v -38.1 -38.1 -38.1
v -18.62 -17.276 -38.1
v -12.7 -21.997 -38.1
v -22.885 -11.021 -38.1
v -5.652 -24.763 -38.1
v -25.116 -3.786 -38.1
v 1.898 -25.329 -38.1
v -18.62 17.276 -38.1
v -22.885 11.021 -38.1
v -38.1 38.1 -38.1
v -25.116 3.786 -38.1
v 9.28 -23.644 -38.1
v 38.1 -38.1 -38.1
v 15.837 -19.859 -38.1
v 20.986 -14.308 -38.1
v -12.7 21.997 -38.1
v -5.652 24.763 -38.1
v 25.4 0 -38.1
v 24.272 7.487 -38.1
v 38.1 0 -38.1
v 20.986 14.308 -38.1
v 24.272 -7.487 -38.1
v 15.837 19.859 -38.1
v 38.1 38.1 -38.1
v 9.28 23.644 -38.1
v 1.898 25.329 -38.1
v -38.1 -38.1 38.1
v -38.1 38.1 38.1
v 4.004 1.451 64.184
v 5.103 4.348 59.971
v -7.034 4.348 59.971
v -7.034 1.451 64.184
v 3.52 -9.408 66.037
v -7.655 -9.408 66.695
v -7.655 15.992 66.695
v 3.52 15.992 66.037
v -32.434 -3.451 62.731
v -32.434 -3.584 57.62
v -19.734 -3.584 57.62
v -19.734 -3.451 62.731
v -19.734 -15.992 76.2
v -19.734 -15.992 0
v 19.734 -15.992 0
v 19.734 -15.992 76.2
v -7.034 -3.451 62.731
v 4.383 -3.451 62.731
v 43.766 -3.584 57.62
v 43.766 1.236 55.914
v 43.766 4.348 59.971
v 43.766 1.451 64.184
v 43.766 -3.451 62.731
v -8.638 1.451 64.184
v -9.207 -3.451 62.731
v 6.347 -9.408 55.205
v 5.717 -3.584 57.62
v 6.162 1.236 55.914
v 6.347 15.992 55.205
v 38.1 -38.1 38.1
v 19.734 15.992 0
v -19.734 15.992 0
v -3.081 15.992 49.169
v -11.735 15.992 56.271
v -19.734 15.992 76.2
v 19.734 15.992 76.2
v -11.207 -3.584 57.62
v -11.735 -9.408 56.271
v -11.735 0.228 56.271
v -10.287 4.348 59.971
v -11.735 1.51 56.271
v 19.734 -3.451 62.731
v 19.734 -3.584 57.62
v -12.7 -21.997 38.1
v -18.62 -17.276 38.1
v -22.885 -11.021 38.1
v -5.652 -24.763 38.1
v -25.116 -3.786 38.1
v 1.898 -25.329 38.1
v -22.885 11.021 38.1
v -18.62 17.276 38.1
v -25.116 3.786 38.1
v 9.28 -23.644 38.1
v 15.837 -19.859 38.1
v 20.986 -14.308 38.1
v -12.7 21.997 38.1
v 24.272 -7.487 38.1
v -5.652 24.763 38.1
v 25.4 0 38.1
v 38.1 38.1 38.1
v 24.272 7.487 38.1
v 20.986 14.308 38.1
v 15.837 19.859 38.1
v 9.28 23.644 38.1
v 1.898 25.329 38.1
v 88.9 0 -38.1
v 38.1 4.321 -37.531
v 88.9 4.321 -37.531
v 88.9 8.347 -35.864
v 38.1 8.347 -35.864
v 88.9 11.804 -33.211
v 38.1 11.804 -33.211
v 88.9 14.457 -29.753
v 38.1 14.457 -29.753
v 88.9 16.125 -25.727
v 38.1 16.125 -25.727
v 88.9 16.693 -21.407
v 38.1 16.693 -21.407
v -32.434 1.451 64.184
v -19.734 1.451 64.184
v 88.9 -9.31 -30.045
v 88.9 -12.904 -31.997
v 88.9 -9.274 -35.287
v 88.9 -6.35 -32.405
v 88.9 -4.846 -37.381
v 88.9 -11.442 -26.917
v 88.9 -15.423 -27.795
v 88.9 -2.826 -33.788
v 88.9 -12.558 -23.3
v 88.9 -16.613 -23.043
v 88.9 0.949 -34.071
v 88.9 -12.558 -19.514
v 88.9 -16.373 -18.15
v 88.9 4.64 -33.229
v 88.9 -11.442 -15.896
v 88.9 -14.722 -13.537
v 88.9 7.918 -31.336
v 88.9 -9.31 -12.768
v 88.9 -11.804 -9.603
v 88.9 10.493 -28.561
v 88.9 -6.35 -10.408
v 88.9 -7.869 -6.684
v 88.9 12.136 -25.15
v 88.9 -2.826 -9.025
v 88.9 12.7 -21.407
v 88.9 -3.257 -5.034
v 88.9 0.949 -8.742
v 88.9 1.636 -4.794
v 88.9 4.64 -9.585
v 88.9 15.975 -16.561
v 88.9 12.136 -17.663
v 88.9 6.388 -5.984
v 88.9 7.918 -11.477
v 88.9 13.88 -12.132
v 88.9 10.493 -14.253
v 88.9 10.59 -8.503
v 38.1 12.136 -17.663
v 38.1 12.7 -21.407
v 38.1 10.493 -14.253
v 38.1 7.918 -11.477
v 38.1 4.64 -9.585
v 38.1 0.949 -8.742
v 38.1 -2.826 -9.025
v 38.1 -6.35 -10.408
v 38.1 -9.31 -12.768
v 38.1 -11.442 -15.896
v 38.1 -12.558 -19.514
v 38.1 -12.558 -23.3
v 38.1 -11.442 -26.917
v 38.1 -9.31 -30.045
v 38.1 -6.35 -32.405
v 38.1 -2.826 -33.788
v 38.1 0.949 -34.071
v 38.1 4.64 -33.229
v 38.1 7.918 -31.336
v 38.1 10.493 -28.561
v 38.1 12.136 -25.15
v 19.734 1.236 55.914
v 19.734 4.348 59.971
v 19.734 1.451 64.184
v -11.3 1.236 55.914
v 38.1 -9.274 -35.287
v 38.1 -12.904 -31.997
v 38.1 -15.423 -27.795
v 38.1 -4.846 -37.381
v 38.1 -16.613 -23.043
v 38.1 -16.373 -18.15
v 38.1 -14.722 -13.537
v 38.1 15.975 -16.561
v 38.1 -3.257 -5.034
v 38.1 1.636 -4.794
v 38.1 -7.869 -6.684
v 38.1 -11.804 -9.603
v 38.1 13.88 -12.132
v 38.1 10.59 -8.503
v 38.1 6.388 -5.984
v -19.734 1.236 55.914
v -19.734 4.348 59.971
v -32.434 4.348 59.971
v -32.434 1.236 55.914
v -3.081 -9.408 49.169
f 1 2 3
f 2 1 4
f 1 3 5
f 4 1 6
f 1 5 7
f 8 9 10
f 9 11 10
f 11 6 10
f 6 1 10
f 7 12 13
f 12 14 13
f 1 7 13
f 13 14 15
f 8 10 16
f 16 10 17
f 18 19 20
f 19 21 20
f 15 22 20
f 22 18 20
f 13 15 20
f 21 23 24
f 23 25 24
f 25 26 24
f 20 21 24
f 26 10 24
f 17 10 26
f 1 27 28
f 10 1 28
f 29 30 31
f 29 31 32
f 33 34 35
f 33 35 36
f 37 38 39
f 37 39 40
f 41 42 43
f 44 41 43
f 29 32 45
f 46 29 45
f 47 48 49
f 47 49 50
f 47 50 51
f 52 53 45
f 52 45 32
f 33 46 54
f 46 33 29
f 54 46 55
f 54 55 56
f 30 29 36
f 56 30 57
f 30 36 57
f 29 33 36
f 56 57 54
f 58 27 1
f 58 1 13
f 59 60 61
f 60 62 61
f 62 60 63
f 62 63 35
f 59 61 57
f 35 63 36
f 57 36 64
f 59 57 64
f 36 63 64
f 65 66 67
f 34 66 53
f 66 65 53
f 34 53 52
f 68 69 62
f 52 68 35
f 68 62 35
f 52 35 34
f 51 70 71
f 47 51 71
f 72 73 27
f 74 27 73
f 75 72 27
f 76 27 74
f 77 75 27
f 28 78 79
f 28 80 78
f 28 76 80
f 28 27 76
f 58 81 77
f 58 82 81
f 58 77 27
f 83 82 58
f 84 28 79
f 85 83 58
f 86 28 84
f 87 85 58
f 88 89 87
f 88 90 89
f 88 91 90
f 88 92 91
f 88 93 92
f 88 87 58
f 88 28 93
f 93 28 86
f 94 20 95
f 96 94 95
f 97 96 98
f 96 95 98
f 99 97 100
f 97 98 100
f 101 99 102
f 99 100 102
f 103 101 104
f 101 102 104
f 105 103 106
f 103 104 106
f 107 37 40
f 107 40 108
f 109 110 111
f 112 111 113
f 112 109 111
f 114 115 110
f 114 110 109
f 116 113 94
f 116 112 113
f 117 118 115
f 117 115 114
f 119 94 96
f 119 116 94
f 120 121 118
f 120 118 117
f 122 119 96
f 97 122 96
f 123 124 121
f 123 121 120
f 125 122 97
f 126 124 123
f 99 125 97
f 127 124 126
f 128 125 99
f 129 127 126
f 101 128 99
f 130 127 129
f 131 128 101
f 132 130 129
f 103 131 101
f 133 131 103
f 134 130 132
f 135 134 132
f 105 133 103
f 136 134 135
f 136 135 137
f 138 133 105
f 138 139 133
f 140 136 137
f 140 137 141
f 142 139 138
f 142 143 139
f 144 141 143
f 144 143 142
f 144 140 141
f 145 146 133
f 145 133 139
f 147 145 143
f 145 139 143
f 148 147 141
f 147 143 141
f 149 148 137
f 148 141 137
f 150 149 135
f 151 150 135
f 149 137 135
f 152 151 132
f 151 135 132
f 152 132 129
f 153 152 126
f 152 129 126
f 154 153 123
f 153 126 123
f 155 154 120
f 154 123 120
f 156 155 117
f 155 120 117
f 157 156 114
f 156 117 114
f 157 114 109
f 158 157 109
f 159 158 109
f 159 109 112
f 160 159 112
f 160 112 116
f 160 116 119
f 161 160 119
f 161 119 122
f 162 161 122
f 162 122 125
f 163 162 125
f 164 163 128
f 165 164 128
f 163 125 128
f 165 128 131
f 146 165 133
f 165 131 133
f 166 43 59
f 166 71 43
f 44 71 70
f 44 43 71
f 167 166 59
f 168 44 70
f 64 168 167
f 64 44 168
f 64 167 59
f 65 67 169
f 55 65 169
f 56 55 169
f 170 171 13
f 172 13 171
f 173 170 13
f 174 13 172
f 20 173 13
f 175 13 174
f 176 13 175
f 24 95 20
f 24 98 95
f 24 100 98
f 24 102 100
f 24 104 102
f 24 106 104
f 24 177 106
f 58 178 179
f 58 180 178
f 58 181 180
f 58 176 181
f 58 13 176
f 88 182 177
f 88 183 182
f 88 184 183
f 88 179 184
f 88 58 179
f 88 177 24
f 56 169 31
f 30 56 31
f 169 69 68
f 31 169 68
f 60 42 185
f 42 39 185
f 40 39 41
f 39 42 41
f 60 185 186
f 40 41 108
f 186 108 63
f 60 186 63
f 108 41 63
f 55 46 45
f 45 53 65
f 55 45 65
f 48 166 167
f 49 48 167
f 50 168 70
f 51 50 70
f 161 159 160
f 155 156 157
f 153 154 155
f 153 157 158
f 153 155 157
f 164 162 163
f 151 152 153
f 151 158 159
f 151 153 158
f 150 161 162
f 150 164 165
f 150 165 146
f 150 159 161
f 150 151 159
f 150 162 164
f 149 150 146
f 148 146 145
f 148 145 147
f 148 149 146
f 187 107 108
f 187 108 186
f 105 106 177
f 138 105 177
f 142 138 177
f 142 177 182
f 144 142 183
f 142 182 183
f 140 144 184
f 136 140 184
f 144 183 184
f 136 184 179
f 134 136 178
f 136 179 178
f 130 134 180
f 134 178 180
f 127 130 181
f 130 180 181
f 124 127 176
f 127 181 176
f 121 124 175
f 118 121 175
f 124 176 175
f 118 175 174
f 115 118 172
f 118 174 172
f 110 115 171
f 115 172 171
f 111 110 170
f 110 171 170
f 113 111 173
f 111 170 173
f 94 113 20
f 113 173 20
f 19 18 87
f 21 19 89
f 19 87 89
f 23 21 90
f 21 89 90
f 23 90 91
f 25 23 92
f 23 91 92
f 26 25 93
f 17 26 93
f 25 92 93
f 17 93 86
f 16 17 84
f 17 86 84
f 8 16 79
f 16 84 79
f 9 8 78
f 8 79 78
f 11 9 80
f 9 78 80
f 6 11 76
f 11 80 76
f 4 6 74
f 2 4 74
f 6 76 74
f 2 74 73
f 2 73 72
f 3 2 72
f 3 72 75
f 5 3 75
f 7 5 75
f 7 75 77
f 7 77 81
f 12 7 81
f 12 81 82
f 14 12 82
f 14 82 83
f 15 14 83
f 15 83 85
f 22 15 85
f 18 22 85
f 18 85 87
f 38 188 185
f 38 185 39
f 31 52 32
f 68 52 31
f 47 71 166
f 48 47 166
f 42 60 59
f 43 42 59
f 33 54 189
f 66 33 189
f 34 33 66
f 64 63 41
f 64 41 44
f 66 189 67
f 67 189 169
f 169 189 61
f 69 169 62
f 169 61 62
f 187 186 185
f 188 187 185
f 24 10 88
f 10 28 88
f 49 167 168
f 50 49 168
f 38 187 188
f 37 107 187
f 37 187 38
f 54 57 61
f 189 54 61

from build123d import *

# Parameters (mm, degrees)
F0_W      = 76.2
F0_H      = 76.2
F1_DEPTH  = 38.1
F2_R      = 25.4
F3_DEPTH  = 76.201
F4_W      = 39.467574
F4_H      = 31.9836
F5_DEPTH  = 38.1
F7_DEPTH  = 25.4
F9_DEPTH  = 12.7
F10_DEPTH = 50.8
F12_DEPTH = 50.8
F13_R     = 12.7
F14_DEPTH = 50.8


with BuildPart() as f1:
    # F0 (on Top) → F1 (new body, symmetric)
    with BuildSketch(Plane.XY):
        Rectangle(F0_W, F0_H)
    extrude(amount=F1_DEPTH, both=True)

    # F2 (on face) → F3 (cut, through all)
    with BuildSketch(Plane.XY.offset(38.1)):
        Circle(F2_R)
    extrude(amount=-F3_DEPTH, mode=Mode.SUBTRACT)

    # F11 (on face) → F12 (join)
    with BuildSketch(Plane.YZ.offset(38.1)):
        with BuildLine():
            ThreePointArc((0, -38.1), (11.803963, -33.210638), (16.693325, -21.406675))
            ThreePointArc((16.693325, -21.406675), (-11.803963, -9.602711), (0, -38.1))
        make_face()
    extrude(amount=F12_DEPTH)

    # F13 (on face) → F14 (cut)
    with BuildSketch(Plane.YZ.offset(88.9)):
        with Locations((0, -21.406675)):
            Circle(F13_R)
    extrude(amount=-F14_DEPTH, mode=Mode.SUBTRACT)


with BuildPart() as f5:
    # F4 (on face) → F5 (new body, symmetric)
    with BuildSketch(Plane.XY.offset(38.1)):
        Rectangle(F4_W, F4_H)
    extrude(amount=F5_DEPTH, both=True)

    # F6 (on face) → F7 (cut)
    with BuildSketch(Plane(origin=(0, 15.9918, 0), x_dir=(-1, 0, 0), z_dir=(0, 1, 0))):
        Polygon((-6.347183, 55.205135), (3.080898, 49.169198), (11.734853, 56.270629), (7.65521, 66.695492), (-3.520103, 66.03698), align=None)
    extrude(amount=-F7_DEPTH, mode=Mode.SUBTRACT)

    # F8 (on face) → F9 (join, symmetric)
    with BuildSketch(Plane(origin=(-19.733787, 0, 0), x_dir=(0, -1, 0), z_dir=(-1, 0, 0))):
        Polygon((-1.451262, 64.183876), (-4.347805, 59.970606), (-1.235829, 55.913858), (3.584021, 57.619919), (3.450876, 62.731071), align=None)
    extrude(amount=F9_DEPTH, both=True)

    # F9_face (on face) → F10 (join)
    with BuildSketch(Plane(origin=(-7.033787, 0, 60.083866), x_dir=(0, -1, 0), z_dir=(1, 0, 0))):
        Polygon((3.450876, -2.647205), (3.584021, 2.463947), (-1.235829, 4.170008), (-4.347805, 0.11326), (-1.451262, -4.100009), align=None)
    extrude(amount=F10_DEPTH)


solid = Compound([f1.part, f5.part])
